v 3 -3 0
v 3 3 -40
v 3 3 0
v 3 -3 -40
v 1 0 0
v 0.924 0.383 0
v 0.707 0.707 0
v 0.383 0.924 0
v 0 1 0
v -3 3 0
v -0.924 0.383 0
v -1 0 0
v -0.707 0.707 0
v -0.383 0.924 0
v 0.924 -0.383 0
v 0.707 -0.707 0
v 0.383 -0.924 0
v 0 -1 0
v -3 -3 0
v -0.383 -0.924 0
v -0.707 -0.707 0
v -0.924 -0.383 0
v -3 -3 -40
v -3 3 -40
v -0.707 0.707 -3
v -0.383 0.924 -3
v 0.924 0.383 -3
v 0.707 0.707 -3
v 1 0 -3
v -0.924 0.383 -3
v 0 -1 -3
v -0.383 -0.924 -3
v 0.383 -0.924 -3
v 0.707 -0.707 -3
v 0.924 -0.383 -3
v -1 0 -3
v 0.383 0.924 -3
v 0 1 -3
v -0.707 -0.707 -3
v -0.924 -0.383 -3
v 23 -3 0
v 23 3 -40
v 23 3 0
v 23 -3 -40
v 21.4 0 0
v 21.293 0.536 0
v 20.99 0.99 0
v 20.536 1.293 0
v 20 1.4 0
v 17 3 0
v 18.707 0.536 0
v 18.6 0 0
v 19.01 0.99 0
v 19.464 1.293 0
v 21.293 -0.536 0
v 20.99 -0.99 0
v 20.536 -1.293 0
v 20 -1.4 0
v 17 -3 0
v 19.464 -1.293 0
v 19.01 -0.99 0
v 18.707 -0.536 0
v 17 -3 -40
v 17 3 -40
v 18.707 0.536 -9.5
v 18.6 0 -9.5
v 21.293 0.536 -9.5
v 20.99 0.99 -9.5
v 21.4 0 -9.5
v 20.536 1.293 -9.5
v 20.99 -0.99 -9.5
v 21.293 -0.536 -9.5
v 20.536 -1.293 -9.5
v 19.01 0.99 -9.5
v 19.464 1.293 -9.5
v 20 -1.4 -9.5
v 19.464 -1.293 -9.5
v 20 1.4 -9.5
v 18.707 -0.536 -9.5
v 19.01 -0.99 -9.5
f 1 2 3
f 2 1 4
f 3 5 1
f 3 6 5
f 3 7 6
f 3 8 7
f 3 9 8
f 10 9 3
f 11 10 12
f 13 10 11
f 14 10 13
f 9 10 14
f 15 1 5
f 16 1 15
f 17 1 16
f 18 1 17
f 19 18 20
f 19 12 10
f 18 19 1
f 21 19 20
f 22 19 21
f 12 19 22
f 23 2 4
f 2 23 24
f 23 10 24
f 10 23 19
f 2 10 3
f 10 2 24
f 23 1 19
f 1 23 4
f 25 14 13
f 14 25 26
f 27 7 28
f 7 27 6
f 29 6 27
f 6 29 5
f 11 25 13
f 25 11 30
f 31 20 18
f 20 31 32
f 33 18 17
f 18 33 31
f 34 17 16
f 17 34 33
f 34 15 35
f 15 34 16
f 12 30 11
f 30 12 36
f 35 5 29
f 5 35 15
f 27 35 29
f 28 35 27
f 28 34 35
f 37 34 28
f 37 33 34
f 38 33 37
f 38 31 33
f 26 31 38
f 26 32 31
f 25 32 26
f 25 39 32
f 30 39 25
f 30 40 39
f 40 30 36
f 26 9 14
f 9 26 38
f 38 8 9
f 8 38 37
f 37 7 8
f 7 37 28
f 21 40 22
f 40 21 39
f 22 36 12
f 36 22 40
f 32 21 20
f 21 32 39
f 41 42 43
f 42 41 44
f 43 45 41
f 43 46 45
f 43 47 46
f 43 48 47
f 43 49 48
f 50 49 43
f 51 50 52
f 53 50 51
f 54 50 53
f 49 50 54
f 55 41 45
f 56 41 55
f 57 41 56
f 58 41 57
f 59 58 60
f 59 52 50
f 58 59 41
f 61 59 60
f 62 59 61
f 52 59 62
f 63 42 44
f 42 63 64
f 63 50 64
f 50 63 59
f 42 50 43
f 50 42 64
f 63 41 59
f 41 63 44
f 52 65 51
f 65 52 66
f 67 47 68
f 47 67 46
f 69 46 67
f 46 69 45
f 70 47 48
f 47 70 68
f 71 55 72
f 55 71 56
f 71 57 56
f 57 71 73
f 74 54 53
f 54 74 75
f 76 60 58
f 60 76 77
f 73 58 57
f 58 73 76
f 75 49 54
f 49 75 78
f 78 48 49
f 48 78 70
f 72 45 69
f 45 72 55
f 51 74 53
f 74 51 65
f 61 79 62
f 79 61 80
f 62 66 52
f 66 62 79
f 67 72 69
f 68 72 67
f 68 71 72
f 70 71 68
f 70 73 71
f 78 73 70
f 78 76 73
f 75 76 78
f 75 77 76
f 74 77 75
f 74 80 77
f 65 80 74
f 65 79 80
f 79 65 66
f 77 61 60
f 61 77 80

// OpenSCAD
use <../prim.scad>
//screw_hole_d2_h3(align="none", volume_type="positive");
//screw_hole_d2_h3(align="x", volume_type="negative");
//screw_hole_d2_h3(align="none", volume_type="positive", with_shell=1, shell_x=20,shell_y=20,shell_z=40);
//screw_hole_d2_h3(align="x", volume_type="positive", with_shell=1, shell_x=20,shell_y=20,shell_z=40);
//screw_hole_d2_h3(align="y", volume_type="positive", with_shell=1, shell_x=20,shell_y=20,shell_z=40);

translate([0,0,0])
screw_hole_d2_h3(align="z", volume_type="positive", with_shell=1, shell_x=6,shell_y=6,shell_z=38);
translate([20,0,0])
screw_hole_d28_h95(align="z", volume_type="positive", with_shell=1, shell_x=6,shell_y=6,shell_z=38);
